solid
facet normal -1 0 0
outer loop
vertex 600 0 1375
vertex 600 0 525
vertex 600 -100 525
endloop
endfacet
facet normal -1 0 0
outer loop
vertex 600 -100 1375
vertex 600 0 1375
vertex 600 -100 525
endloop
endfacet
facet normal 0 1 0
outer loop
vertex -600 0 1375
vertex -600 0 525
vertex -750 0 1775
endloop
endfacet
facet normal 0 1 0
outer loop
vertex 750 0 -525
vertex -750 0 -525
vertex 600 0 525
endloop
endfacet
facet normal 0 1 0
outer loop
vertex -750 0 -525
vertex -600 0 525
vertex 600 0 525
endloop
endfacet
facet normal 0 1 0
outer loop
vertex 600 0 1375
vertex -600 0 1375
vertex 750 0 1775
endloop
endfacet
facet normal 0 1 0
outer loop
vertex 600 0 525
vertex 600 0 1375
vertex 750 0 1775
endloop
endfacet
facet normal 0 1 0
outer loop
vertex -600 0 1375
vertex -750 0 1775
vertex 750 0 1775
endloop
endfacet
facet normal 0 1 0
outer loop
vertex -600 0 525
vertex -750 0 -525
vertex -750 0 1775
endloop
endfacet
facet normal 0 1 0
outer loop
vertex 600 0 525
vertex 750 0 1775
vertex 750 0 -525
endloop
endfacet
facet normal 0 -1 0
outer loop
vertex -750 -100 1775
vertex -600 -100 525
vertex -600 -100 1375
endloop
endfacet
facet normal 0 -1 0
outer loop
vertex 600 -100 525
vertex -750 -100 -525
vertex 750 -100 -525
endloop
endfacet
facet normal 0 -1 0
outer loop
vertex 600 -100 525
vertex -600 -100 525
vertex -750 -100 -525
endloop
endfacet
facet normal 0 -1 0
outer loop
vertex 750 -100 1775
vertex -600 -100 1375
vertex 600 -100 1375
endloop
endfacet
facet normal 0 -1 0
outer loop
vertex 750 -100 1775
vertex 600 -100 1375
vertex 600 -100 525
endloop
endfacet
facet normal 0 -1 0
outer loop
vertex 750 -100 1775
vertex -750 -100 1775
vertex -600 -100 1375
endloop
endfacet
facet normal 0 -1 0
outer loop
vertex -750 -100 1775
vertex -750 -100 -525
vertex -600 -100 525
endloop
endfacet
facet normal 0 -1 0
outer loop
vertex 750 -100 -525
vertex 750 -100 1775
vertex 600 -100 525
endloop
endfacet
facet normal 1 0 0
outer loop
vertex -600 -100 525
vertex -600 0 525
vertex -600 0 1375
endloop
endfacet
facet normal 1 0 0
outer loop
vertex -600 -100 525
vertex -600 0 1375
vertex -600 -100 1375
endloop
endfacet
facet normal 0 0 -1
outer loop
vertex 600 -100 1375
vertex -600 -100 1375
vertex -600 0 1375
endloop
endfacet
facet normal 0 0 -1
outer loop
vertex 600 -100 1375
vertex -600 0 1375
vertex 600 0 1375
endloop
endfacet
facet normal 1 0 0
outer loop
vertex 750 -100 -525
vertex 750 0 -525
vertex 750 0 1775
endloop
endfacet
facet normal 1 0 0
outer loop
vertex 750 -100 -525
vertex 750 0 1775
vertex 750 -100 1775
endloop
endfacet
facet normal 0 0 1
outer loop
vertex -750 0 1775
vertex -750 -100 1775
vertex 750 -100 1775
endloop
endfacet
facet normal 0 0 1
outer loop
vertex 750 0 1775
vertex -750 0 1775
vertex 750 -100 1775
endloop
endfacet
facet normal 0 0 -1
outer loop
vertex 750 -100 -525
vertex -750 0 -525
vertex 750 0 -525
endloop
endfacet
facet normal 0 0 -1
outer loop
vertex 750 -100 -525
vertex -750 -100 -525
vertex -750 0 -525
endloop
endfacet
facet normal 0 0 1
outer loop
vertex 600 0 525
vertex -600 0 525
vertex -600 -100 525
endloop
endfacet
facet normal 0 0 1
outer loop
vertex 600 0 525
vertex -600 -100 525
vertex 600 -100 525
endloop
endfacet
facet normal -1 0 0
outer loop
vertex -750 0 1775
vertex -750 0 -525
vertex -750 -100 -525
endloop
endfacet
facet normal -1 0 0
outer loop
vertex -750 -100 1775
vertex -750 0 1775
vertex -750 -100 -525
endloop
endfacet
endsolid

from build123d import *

# Parameters (mm, degrees)
F0_W     = 1200
F0_H     = 1050
F1_DEPTH = 100
F2_W     = 150
F2_H     = 100
F3_DEPTH = 2300
F4_W     = 1200
F4_H     = 400
F5_DEPTH = 100


with BuildPart() as f1:
    # F0 (on Front) → F1 (new body)
    with BuildSketch(Plane.XZ):
        Rectangle(F0_W, F0_H)
    extrude(amount=F1_DEPTH)

    # F2 (on face) → F3 (join)
    with BuildSketch(Plane(origin=(0, 0, -525), x_dir=(1, 0, 0), z_dir=(0, 0, -1))):
        with Locations((675, 50)):
            Rectangle(F2_W, F2_H)
        with Locations((-675, 50)):
            Rectangle(F2_W, F2_H)
    extrude(amount=-F3_DEPTH)

    # F4 (on face) → F5 (join, through all)
    with BuildSketch(Plane.XZ.offset(100)):
        with Locations((0, 1575)):
            Rectangle(F4_W, F4_H)
    extrude(amount=-F5_DEPTH)


solid = f1.part
